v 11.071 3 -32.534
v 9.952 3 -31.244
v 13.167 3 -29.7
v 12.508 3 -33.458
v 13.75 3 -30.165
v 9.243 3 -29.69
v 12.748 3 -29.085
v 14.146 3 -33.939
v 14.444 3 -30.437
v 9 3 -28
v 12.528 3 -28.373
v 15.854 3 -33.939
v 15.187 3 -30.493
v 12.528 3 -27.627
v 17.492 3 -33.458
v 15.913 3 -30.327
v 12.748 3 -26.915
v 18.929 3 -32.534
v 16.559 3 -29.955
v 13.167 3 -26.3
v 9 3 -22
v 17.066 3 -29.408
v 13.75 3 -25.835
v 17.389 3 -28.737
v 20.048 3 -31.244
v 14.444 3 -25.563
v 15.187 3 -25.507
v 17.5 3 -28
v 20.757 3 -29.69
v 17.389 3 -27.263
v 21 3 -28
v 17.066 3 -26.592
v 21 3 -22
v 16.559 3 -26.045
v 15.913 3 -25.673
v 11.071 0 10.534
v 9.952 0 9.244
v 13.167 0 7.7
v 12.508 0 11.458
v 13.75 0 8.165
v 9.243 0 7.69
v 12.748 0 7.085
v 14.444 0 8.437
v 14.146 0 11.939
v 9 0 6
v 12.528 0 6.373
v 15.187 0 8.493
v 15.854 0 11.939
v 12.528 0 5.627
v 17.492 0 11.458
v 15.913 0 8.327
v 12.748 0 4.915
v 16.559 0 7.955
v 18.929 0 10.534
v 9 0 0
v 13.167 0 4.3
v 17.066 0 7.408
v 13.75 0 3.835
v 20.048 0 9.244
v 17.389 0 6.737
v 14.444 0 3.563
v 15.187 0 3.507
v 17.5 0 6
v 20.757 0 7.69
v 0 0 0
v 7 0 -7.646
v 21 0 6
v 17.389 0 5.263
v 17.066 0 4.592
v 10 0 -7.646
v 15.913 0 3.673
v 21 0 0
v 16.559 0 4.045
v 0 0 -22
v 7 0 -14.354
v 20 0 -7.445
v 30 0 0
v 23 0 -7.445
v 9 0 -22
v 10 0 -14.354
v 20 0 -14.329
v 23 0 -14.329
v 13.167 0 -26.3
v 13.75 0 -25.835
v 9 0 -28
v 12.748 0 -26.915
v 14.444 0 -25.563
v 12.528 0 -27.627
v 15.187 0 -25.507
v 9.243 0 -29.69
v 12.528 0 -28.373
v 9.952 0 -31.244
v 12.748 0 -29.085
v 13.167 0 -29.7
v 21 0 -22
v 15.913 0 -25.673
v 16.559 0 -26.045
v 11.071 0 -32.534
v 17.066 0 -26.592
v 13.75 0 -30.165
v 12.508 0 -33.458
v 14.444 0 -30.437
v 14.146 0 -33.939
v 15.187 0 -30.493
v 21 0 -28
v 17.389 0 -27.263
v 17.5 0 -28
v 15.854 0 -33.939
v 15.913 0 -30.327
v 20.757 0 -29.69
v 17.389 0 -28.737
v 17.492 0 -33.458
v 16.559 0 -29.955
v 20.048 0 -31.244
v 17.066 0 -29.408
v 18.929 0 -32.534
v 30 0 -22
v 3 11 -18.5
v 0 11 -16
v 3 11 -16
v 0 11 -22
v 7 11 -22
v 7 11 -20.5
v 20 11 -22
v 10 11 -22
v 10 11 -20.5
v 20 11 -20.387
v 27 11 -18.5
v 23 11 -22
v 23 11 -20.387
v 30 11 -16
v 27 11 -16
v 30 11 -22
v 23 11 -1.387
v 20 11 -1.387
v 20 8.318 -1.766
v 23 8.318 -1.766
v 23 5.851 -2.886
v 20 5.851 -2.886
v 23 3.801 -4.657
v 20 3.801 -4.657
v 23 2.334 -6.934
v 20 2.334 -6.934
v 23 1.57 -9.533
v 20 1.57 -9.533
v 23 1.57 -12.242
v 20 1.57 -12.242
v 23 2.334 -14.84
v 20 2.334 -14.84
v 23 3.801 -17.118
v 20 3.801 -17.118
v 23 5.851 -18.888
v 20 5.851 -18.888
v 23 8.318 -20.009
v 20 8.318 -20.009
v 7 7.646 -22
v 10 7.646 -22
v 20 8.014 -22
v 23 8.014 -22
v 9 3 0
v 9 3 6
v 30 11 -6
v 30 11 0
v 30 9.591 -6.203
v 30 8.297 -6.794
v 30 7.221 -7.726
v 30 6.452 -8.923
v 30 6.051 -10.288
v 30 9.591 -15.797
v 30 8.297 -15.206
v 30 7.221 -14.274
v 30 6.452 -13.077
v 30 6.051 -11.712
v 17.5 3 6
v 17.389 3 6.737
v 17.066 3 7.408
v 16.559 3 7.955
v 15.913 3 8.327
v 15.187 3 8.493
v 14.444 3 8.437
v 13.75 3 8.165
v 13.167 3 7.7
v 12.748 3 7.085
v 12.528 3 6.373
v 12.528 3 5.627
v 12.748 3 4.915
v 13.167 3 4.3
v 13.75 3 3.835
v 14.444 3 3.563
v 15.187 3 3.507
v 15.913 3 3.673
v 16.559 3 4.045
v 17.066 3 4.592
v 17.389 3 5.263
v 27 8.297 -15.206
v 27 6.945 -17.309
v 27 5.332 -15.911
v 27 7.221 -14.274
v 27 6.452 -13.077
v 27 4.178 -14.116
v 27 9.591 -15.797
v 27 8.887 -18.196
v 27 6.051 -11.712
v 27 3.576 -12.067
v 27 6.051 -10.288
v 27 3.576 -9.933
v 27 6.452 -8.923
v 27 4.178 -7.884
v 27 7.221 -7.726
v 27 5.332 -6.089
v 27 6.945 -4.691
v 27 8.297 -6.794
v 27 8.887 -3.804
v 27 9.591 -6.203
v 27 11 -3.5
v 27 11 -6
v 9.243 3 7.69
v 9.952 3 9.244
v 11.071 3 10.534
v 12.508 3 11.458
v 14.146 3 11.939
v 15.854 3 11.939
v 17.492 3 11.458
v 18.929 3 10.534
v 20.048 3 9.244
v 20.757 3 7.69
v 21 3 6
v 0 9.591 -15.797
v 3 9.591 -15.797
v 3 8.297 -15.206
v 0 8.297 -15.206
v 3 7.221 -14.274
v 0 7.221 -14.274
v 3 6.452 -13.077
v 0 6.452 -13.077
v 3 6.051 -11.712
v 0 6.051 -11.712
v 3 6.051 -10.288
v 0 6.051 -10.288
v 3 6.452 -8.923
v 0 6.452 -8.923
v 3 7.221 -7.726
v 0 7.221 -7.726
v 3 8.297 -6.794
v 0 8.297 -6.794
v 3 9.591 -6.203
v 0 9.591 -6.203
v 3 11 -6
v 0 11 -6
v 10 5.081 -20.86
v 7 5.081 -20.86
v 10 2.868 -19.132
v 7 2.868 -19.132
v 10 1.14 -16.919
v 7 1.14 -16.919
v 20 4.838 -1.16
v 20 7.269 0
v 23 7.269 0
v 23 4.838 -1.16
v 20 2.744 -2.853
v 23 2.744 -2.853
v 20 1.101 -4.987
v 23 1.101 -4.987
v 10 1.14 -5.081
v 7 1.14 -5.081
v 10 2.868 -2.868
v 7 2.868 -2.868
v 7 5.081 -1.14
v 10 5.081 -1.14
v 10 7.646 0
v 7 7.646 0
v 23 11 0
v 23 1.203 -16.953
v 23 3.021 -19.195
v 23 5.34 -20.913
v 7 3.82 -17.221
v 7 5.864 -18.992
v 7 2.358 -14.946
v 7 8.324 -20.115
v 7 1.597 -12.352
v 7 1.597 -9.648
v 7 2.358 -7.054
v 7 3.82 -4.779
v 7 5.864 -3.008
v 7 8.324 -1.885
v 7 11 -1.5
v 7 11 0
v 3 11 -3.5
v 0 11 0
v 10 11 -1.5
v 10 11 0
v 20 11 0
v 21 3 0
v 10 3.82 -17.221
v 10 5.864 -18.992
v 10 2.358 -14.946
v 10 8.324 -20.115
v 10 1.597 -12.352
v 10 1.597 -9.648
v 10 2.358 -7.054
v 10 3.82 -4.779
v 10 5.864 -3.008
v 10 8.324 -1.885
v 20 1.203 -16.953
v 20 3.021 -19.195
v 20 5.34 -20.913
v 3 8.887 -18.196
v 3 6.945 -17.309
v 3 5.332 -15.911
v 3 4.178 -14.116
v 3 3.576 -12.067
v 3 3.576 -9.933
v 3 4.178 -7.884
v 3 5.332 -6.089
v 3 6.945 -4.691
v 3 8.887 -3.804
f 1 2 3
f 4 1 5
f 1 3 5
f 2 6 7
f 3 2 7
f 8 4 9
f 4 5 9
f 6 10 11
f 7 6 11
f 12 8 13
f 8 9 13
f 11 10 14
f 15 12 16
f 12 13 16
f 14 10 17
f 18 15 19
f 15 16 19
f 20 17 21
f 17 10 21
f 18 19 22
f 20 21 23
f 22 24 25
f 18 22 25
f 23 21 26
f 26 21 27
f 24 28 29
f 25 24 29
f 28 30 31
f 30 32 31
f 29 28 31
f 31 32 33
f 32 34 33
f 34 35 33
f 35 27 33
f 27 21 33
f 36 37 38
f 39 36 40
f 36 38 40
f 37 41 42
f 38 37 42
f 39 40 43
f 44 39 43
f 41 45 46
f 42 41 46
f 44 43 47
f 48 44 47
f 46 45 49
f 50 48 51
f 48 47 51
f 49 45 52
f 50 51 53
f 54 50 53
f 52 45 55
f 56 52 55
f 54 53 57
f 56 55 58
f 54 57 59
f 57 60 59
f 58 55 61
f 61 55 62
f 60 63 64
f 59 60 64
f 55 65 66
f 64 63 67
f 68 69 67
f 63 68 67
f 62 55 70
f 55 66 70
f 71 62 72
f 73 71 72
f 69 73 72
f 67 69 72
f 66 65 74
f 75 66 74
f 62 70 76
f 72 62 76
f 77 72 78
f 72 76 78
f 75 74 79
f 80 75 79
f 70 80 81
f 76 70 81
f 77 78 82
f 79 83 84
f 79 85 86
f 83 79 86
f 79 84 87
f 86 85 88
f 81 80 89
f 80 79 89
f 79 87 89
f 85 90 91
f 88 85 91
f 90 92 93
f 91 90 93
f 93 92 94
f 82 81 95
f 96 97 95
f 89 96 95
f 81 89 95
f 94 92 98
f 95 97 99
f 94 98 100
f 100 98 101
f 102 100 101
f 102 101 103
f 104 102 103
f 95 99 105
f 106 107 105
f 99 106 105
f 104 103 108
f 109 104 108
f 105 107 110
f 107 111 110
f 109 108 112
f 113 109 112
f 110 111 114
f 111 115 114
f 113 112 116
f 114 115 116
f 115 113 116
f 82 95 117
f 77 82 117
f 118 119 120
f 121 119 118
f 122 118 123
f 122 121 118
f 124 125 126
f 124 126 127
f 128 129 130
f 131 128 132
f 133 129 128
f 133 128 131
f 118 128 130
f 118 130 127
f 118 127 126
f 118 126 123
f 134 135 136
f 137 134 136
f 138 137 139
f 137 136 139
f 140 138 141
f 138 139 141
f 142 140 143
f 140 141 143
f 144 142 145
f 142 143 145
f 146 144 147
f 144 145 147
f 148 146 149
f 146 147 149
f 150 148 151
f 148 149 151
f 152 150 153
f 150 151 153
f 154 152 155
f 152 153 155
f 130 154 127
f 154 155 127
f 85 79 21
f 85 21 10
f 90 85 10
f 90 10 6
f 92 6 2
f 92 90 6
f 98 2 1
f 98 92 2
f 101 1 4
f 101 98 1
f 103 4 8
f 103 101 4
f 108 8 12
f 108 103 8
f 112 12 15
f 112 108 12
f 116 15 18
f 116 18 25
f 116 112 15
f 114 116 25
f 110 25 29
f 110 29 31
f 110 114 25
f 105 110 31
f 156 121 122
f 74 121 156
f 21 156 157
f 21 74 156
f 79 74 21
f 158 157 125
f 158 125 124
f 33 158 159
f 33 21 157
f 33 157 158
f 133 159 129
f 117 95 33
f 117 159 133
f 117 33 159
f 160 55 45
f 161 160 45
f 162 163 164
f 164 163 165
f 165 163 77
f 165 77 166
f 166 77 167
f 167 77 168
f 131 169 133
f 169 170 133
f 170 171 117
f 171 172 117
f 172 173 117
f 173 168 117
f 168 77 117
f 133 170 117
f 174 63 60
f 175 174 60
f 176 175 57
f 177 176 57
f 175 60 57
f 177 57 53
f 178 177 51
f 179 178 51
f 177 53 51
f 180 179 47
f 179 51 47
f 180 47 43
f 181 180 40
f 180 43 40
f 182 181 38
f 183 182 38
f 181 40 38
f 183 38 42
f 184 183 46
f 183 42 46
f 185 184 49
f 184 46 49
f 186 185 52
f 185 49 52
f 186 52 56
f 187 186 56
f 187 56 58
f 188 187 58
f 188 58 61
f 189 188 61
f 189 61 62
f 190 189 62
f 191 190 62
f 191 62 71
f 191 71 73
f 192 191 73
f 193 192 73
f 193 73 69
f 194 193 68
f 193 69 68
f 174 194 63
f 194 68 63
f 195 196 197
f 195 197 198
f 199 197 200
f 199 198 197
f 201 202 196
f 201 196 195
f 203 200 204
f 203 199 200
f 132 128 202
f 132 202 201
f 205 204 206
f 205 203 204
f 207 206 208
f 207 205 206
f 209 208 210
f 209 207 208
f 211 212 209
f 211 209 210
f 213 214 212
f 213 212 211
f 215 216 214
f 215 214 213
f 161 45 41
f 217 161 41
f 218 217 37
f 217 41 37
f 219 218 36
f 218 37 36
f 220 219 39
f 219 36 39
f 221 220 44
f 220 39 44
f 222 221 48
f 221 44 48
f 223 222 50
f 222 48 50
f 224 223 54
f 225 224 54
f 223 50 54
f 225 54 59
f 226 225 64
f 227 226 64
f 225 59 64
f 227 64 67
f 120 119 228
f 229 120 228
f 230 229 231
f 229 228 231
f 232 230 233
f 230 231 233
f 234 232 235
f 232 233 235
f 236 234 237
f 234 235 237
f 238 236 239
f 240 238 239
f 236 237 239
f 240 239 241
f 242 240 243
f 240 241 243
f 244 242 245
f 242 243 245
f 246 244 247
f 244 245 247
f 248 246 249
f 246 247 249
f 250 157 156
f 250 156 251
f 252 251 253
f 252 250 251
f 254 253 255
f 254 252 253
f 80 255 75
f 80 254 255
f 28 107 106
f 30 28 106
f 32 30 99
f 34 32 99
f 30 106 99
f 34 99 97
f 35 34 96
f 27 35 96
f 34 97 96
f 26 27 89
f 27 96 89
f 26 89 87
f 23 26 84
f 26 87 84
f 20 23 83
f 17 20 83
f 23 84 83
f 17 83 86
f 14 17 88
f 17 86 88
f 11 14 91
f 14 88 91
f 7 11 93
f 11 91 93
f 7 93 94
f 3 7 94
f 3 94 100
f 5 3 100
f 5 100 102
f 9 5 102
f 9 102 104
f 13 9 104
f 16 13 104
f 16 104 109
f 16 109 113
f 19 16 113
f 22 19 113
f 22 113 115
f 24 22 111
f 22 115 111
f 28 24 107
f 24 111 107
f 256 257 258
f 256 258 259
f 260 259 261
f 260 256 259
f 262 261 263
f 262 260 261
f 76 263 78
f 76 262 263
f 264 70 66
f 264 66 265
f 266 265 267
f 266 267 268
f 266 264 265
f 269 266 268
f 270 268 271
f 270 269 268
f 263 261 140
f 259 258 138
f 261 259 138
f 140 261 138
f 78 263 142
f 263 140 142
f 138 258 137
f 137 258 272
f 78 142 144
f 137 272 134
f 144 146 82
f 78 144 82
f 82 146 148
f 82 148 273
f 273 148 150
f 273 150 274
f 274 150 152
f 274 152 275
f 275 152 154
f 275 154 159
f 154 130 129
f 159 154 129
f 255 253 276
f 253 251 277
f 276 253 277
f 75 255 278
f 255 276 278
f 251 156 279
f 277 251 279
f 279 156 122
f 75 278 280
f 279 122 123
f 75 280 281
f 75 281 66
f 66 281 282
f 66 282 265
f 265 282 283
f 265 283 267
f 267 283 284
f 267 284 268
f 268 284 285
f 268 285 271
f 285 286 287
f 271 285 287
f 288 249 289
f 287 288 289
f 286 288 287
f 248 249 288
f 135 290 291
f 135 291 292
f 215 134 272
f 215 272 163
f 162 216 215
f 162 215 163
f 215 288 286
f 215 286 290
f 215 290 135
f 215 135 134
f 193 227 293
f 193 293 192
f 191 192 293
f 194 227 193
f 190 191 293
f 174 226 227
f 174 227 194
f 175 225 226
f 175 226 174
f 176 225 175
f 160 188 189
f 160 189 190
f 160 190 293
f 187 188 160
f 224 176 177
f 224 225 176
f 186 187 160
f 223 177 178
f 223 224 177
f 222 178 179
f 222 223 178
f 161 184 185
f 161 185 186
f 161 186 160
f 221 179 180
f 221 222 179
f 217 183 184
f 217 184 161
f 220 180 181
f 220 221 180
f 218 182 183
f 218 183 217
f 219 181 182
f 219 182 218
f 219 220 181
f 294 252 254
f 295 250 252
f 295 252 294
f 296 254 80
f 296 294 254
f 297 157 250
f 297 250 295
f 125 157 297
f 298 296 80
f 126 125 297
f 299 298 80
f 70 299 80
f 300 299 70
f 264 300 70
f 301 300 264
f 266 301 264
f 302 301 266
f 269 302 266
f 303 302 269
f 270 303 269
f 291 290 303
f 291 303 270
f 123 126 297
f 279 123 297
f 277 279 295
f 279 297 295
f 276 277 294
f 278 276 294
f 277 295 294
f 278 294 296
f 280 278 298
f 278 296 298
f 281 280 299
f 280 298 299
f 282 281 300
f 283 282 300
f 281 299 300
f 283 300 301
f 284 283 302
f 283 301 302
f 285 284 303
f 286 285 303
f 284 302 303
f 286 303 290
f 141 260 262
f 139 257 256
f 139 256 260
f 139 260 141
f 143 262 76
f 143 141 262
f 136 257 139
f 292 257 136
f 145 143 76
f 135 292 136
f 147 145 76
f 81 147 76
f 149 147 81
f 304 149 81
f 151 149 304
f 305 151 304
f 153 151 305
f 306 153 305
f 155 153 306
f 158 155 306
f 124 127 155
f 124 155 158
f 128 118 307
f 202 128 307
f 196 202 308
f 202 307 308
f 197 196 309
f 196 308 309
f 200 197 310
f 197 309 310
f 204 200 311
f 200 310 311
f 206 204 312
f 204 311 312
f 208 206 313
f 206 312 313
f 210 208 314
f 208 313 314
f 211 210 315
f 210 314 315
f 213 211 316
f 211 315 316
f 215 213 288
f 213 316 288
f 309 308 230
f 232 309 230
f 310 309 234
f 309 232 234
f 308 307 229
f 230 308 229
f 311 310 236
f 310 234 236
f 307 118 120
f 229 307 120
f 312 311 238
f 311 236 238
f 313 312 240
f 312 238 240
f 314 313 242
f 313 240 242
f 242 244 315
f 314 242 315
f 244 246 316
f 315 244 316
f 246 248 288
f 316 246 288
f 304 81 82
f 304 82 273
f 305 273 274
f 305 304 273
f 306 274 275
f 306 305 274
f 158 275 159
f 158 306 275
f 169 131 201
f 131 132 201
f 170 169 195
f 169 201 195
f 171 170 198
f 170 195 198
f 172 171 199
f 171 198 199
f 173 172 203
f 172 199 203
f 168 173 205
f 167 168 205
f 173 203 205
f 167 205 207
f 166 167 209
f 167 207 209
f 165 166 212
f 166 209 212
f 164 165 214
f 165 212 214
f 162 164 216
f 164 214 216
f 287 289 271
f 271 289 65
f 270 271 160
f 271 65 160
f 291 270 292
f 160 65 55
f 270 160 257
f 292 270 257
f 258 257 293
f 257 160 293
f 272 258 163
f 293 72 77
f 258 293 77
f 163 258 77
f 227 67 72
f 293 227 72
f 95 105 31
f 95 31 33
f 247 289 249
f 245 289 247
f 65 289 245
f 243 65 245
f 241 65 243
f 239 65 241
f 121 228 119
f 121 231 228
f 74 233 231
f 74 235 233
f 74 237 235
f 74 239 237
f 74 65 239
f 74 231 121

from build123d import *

# Parameters (mm, degrees)
CROQUIS1_W              = 30
CROQUIS1_H              = 22
SALIENTE_EXTRUIR1_DEPTH = 11
CROQUIS2_R              = 2.5
SALIENTE_EXTRUIR2_DEPTH = 3
CROQUIS3_R              = 5
CORTAR_EXTRUIR1_DEPTH   = 31
CROQUIS4_R              = 11.5
CROQUIS4_R_2            = 9.5
CORTAR_EXTRUIR13_DEPTH  = 3
CROQUIS6_R              = 11.5
CROQUIS6_R_2            = 9.5
CORTAR_EXTRUIR14_DEPTH  = 3
CROQUIS7_R              = 7.5
CORTAR_EXTRUIR15_DEPTH  = 24


with BuildPart() as part:
    # Croquis1 → Saliente-Extruir1 (new body)
    with BuildSketch(Plane(origin=(0, 0, 0), x_dir=(1, 0, 0), z_dir=(0, 1, 0))):
        with Locations((15, 11)):
            Rectangle(CROQUIS1_W, CROQUIS1_H)
    extrude(amount=SALIENTE_EXTRUIR1_DEPTH)

    # Croquis2 → Saliente-Extruir2 (add)
    with BuildSketch(Plane.XZ):
        with BuildLine():
            Line((21, 6), (21, 0))
            Line((21, 0), (9, 0))
            Line((9, 0), (9, 6))
            ThreePointArc((9, 6), (15, 12), (21, 6))
        make_face()
        with Locations((15, 6)):
            Circle(CROQUIS2_R, mode=Mode.SUBTRACT)
        with BuildLine():
            Line((9, -22), (9, -28))
            ThreePointArc((9, -28), (15, -34), (21, -28))
            Line((21, -28), (21, -22))
            Line((21, -22), (9, -22))
        make_face()
        with Locations((15, -28)):
            Circle(CROQUIS2_R, mode=Mode.SUBTRACT)
    extrude(amount=-SALIENTE_EXTRUIR2_DEPTH)

    # Croquis3 → Cortar-Extruir1 (cut, through all)
    with BuildSketch(Plane.ZY):
        with Locations((-11, 11)):
            Circle(CROQUIS3_R)
    extrude(amount=-CORTAR_EXTRUIR1_DEPTH, mode=Mode.SUBTRACT)

    # Croquis4 → Cortar-Extruir13 (cut)
    with BuildSketch(Plane.ZY.offset(-10)):
        with Locations((-11, 11)):
            Circle(CROQUIS4_R)
        with Locations((-11, 11)):
            Circle(CROQUIS4_R_2, mode=Mode.SUBTRACT)
    extrude(amount=CORTAR_EXTRUIR13_DEPTH, mode=Mode.SUBTRACT)

    # Croquis6 → Cortar-Extruir14 (cut)
    with BuildSketch(Plane(origin=(20, 0, 0), x_dir=(0, 0, -1), z_dir=(1, 0, 0))):
        with Locations((10.887185848, 10.972715561)):
            Circle(CROQUIS6_R)
        with Locations((10.887185848, 10.972715561)):
            Circle(CROQUIS6_R_2, mode=Mode.SUBTRACT)
    extrude(amount=CORTAR_EXTRUIR14_DEPTH, mode=Mode.SUBTRACT)

    # Croquis7 → Cortar-Extruir15 (cut)
    with BuildSketch(Plane.ZY.offset(-3)):
        with Locations((-11, 11)):
            Circle(CROQUIS7_R)
    extrude(amount=-CORTAR_EXTRUIR15_DEPTH, mode=Mode.SUBTRACT)


solid = part.part
